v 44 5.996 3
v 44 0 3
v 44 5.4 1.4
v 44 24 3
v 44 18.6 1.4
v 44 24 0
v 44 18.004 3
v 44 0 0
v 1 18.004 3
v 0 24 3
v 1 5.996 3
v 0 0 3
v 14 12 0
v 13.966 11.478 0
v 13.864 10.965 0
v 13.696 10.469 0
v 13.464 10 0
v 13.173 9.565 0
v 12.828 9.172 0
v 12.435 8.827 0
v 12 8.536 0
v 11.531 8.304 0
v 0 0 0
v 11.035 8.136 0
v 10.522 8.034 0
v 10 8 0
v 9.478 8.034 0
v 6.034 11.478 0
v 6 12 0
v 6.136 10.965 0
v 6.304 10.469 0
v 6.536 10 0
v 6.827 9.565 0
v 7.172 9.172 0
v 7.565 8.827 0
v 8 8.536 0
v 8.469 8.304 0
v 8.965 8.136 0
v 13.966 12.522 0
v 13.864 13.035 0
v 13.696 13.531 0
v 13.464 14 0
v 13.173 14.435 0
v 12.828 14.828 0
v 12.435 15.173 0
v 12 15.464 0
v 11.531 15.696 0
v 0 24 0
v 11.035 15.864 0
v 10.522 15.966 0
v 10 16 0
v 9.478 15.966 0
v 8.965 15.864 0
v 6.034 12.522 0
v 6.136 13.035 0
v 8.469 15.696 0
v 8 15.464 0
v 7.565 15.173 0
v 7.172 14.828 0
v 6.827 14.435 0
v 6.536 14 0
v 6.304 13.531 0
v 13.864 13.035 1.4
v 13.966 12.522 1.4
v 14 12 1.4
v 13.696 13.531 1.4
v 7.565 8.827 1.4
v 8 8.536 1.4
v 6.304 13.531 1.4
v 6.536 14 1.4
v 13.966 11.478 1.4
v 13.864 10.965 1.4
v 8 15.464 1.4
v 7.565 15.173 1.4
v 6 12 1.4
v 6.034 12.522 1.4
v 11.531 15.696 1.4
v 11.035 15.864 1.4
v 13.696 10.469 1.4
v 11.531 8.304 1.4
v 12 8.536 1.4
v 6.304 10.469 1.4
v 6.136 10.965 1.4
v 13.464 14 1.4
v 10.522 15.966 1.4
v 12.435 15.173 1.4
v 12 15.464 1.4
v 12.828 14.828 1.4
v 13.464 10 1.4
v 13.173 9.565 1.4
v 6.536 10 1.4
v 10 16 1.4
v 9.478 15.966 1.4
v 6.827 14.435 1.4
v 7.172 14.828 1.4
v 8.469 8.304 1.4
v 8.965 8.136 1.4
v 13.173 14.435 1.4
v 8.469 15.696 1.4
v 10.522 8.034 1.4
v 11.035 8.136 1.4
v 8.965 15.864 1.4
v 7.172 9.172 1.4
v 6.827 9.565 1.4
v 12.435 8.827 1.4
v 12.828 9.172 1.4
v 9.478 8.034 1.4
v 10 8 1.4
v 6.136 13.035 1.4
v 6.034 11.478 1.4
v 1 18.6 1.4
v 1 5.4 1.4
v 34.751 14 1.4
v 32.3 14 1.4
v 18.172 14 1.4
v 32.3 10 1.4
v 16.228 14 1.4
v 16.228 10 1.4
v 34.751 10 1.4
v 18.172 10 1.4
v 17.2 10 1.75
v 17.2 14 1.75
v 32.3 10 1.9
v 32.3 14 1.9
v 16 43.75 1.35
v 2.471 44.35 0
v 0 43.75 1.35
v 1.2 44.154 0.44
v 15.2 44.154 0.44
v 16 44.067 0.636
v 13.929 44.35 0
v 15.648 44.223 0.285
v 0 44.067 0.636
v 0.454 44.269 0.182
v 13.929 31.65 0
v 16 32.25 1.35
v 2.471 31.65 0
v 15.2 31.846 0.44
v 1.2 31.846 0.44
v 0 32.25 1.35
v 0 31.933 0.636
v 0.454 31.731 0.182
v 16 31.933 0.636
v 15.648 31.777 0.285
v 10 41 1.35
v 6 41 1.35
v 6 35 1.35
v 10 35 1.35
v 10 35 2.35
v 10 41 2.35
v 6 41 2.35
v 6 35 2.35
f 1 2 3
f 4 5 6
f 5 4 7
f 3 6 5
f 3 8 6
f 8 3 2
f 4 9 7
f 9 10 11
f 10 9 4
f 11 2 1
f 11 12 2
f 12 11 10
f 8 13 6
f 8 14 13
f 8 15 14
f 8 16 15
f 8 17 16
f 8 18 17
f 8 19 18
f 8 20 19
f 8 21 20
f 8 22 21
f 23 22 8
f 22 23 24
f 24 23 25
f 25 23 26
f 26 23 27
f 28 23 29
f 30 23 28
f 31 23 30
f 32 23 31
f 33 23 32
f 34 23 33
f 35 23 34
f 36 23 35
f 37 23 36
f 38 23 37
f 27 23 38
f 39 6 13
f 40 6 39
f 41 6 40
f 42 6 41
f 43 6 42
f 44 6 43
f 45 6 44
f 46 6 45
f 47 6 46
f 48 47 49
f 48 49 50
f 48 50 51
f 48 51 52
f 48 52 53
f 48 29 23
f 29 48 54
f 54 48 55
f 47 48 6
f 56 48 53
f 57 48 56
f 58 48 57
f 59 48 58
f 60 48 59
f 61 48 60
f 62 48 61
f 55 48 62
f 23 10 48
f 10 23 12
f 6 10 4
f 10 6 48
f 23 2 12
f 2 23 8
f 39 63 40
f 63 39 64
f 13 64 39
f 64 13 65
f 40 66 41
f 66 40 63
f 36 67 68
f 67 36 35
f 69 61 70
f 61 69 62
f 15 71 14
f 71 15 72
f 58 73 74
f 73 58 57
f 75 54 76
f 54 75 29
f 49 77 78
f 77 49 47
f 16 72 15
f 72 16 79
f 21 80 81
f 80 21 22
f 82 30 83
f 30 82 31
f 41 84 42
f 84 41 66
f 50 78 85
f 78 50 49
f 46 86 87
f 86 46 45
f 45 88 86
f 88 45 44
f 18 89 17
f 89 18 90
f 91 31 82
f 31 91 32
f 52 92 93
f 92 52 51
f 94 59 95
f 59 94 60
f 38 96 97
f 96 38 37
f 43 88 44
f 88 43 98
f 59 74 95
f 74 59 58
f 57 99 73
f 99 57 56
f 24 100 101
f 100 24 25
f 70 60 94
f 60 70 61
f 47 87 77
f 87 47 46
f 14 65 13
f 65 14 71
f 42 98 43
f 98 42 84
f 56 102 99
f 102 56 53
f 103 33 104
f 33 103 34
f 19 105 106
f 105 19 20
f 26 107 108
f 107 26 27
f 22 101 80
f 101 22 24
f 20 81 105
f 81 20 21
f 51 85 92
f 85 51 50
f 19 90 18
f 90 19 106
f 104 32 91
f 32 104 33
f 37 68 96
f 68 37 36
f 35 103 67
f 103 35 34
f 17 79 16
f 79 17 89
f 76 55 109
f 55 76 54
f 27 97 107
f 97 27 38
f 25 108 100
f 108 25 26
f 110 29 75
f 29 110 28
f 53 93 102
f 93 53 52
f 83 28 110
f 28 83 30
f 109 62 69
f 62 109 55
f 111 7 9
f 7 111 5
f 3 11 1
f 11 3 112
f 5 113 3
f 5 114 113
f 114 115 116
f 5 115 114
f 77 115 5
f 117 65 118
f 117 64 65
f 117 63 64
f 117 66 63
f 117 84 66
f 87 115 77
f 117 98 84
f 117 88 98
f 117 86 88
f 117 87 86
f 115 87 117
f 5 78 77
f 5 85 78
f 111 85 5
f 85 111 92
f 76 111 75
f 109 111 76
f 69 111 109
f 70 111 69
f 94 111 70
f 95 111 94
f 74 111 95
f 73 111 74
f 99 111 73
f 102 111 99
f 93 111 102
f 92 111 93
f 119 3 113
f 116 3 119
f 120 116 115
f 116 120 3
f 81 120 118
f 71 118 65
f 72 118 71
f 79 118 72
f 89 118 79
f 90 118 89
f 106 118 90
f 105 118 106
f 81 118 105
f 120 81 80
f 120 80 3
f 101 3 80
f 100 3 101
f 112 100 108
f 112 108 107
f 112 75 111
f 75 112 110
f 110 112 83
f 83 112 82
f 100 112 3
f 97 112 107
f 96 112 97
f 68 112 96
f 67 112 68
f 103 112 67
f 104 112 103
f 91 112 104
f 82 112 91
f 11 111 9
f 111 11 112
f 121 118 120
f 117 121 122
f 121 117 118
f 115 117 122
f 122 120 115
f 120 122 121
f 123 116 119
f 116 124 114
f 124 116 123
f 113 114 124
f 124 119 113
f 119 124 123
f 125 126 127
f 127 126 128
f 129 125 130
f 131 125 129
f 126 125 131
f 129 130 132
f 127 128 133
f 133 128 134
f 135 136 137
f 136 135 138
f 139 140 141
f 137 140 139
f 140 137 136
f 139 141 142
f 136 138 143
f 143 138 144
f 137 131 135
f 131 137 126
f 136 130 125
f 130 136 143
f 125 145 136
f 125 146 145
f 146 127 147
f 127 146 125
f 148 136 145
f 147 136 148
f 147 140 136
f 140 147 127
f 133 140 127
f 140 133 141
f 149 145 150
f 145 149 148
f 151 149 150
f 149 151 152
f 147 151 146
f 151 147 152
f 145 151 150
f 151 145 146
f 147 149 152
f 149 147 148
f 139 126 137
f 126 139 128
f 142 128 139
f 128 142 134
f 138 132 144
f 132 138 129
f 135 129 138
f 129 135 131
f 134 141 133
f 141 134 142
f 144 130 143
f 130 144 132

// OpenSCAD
// Prisma — tapa deslizante de la cámara, PIEZA DE PRUEBA v0.2 (D026)
//
// Un trozo de frontal de 3 mm (el mismo grosor de pared que la carcasa) con el agujero del
// objetivo y la guía en cola de milano, más la corredera. Sirve para ajustar holguras antes
// de incorporar la guía al frontal definitivo.
//
// Impresión: las dos piezas planas sobre la cama, cara vista hacia arriba, sin soportes.
// La corredera entra por el extremo abierto de la guía y queda retenida por la cola de milano.
// v0.2: un único resalte en rampa (en vez de dos escalones) cae en una de las dos muescas de la
// corredera, separadas justo el recorrido: hace «clic» en abierta y en cerrada y en medio la corredera
// pasa por encima. Al final de la guía, un tope de un solo sentido deja meter la corredera pero no sacarla.

$fn = 48;

wall       = 3;      // grosor del frontal (como la carcasa)
lens_d     = 8;      // agujero del objetivo (Camera Module 3)
track_h    = 12;     // ancho de la guía (en la cara vista)
track_d    = 1.6;    // profundidad de la guía
dovetail   = 0.6;    // rebaje de la cola de milano a cada lado
slider_l   = 16;     // largo de la corredera
travel     = 14;     // recorrido: con 14 mm el objetivo queda totalmente libre
clear      = 0.25;   // holgura corredera-guía por lado
grip_h     = 1.0;    // resalte para empujar con el dedo
detent     = 0.35;   // altura del resalte de retención (rampa)
det_l      = 2;      // largo de la rampa
det_w      = 4;      // ancho del resalte (centrado en la guía)
notch_d    = 0.45;   // profundidad de las muescas en V de la corredera
notch_x    = [1.2, 1.2 + travel];   // muescas separadas exactamente el recorrido
stop_h     = 0.5;    // tope de fin de guía

plate_l = slider_l + travel + 14;
plate_h = 24;
lens_x  = 10;        // posición del objetivo sobre la placa de prueba

// Sección en cola de milano (más ancha abajo), extruida a lo largo de X
module dovetail_profile(w, d, u, len) {
    rotate([90, 0, 90]) linear_extrude(len)
        polygon([[-w / 2 - u, 0], [w / 2 + u, 0], [w / 2, d], [-w / 2, d]]);
}

module placa() {
    difference() {
        cube([plate_l, plate_h, wall]);
        // agujero del objetivo
        translate([lens_x, plate_h / 2, -1]) cylinder(d = lens_d, h = wall + 2);
        // guía abierta por el extremo derecho
        translate([lens_x - slider_l / 2 - 1, plate_h / 2, wall - track_d])
            dovetail_profile(track_h, track_d + 0.01, dovetail, plate_l);
    }
    // resalte de retención: con la corredera cerrada cae en su muesca derecha y, abierta, en la izquierda
    translate([lens_x - slider_l / 2 + notch_x[1], plate_h / 2, wall - track_d - 0.01]) bump(det_l, det_w, detent);
    // tope de fin de guía: rampa por la derecha (se entra) y cara recta por la izquierda (no se sale)
    translate([lens_x - slider_l / 2 + slider_l + travel + 0.3, plate_h / 2, wall - track_d - 0.01]) stop(stop_h);
}
// Resalte en rampa simétrica (sección triangular en X), centrado en (0, 0)
module bump(l, w, h) translate([0, -w / 2, 0]) rotate([90, 0, 0]) mirror([0, 0, 1])
    linear_extrude(w) polygon([[-l / 2, 0], [l / 2, 0], [0, h + 0.01]]);
// Tope de un solo sentido: cara recta en x = 0, rampa hacia +x
module stop(h, l = 2.5, w = 4) translate([0, -w / 2, 0]) rotate([90, 0, 0]) mirror([0, 0, 1])
    linear_extrude(w) polygon([[0, 0], [l, 0], [0, h + 0.01]]);

module corredera() {
    w = track_h - 2 * clear;
    d = track_d - clear;
    difference() {
        union() {
            dovetail_profile(w, d, dovetail, slider_l);
            // resalte para el dedo
            translate([slider_l / 2 - 2, -3, d - 0.05]) cube([4, 6, grip_h + 0.05]);
        }
        // muescas en V para el resalte, separadas el recorrido
        for (x = notch_x) translate([x, w / 2 + dovetail + 1, -0.01]) rotate([90, 0, 0])
            linear_extrude(w + 2 * dovetail + 2) polygon([[-det_l / 2 - 0.3, 0], [det_l / 2 + 0.3, 0], [0, notch_d]]);
        // chaflanes en los extremos para que suba por la rampa y el tope
        for (x = [0, slider_l]) translate([x, 0, 0]) rotate([0, 45, 0]) cube([0.9, w + 4, 0.9], center = true);
    }
}

placa();
// la corredera se imprime al lado; para verla montada: translate([lens_x - slider_l / 2, plate_h / 2, wall - track_d])
translate([0, plate_h + 8 + track_h / 2, 0]) corredera();
